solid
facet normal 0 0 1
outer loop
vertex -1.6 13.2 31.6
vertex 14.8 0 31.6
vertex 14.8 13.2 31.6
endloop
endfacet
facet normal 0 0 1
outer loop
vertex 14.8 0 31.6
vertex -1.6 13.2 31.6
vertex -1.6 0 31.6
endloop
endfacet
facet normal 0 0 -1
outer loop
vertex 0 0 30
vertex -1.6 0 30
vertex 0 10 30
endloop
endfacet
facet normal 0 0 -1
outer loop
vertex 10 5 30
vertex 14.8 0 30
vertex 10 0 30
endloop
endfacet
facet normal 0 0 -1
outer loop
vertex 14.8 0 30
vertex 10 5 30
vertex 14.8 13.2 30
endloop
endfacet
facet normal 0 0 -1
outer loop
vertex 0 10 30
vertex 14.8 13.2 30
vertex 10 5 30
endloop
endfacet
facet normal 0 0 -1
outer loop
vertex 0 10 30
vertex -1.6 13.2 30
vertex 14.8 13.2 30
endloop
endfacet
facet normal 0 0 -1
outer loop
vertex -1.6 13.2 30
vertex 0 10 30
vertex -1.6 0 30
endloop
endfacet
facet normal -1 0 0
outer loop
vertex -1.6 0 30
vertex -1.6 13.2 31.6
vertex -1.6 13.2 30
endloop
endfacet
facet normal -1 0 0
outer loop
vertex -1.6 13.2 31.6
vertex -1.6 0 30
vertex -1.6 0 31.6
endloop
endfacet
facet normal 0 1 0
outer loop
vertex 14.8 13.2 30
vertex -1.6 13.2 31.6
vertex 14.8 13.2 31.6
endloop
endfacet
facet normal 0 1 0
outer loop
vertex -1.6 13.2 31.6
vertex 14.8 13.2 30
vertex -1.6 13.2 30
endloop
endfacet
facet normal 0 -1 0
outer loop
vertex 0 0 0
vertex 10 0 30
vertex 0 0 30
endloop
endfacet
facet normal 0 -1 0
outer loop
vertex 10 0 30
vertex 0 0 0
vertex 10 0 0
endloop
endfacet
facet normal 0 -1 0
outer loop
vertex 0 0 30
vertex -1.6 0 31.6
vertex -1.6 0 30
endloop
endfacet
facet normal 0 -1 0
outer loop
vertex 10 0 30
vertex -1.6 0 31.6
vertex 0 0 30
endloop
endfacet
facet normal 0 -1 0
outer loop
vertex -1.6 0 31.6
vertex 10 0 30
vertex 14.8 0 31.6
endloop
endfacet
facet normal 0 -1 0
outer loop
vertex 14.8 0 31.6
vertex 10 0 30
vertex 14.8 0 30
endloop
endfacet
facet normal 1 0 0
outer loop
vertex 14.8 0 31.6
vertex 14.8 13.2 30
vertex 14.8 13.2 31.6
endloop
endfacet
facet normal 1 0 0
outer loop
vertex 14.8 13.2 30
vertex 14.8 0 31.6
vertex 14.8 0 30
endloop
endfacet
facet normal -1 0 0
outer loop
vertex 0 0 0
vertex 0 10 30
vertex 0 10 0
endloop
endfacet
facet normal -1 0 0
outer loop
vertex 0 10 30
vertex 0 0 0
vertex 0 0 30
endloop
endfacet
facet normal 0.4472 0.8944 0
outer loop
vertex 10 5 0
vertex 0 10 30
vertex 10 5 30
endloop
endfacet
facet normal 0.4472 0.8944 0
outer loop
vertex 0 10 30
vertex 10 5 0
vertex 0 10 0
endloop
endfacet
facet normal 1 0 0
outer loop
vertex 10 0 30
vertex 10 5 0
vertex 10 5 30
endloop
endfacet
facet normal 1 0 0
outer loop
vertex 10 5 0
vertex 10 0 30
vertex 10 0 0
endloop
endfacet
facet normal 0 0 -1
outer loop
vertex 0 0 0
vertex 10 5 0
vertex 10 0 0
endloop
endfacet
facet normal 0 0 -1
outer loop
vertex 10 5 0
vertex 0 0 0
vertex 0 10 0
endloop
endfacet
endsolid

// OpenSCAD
// Dimensions in mm
outer_diameter_spout = 10;
inner_bore_spout = outer_diameter_spout - 2 * 1.6; // 6.8 mm
height_cone = 30;
wall_thickness = 1.6;

// Spout
translate([0, 0, 0]) 
    linear_extrude(height = height_cone) 
        polygon(points=[[0, 0], [outer_diameter_spout, 0], [outer_diameter_spout, outer_diameter_spout/2], [0, outer_diameter_spout]]);

// Cone
translate([0, 0, height_cone]) 
    rotate_extrude(height = height_cone) 
        polygon(points=[[0, 0], [outer_diameter_spout, 0], [outer_diameter_spout + (60-outer_diameter_spout)/2 * sqrt(3), outer_diameter_spout/2]]); 

// Wall
translate([0, 0, height_cone]) 
    for (x = [-wall_thickness, wall_thickness]) 
        translate([x, 0, 0])
            cube(size=[outer_diameter_spout + 2 * wall_thickness, outer_diameter_spout + 2 * wall_thickness, wall_thickness]);
